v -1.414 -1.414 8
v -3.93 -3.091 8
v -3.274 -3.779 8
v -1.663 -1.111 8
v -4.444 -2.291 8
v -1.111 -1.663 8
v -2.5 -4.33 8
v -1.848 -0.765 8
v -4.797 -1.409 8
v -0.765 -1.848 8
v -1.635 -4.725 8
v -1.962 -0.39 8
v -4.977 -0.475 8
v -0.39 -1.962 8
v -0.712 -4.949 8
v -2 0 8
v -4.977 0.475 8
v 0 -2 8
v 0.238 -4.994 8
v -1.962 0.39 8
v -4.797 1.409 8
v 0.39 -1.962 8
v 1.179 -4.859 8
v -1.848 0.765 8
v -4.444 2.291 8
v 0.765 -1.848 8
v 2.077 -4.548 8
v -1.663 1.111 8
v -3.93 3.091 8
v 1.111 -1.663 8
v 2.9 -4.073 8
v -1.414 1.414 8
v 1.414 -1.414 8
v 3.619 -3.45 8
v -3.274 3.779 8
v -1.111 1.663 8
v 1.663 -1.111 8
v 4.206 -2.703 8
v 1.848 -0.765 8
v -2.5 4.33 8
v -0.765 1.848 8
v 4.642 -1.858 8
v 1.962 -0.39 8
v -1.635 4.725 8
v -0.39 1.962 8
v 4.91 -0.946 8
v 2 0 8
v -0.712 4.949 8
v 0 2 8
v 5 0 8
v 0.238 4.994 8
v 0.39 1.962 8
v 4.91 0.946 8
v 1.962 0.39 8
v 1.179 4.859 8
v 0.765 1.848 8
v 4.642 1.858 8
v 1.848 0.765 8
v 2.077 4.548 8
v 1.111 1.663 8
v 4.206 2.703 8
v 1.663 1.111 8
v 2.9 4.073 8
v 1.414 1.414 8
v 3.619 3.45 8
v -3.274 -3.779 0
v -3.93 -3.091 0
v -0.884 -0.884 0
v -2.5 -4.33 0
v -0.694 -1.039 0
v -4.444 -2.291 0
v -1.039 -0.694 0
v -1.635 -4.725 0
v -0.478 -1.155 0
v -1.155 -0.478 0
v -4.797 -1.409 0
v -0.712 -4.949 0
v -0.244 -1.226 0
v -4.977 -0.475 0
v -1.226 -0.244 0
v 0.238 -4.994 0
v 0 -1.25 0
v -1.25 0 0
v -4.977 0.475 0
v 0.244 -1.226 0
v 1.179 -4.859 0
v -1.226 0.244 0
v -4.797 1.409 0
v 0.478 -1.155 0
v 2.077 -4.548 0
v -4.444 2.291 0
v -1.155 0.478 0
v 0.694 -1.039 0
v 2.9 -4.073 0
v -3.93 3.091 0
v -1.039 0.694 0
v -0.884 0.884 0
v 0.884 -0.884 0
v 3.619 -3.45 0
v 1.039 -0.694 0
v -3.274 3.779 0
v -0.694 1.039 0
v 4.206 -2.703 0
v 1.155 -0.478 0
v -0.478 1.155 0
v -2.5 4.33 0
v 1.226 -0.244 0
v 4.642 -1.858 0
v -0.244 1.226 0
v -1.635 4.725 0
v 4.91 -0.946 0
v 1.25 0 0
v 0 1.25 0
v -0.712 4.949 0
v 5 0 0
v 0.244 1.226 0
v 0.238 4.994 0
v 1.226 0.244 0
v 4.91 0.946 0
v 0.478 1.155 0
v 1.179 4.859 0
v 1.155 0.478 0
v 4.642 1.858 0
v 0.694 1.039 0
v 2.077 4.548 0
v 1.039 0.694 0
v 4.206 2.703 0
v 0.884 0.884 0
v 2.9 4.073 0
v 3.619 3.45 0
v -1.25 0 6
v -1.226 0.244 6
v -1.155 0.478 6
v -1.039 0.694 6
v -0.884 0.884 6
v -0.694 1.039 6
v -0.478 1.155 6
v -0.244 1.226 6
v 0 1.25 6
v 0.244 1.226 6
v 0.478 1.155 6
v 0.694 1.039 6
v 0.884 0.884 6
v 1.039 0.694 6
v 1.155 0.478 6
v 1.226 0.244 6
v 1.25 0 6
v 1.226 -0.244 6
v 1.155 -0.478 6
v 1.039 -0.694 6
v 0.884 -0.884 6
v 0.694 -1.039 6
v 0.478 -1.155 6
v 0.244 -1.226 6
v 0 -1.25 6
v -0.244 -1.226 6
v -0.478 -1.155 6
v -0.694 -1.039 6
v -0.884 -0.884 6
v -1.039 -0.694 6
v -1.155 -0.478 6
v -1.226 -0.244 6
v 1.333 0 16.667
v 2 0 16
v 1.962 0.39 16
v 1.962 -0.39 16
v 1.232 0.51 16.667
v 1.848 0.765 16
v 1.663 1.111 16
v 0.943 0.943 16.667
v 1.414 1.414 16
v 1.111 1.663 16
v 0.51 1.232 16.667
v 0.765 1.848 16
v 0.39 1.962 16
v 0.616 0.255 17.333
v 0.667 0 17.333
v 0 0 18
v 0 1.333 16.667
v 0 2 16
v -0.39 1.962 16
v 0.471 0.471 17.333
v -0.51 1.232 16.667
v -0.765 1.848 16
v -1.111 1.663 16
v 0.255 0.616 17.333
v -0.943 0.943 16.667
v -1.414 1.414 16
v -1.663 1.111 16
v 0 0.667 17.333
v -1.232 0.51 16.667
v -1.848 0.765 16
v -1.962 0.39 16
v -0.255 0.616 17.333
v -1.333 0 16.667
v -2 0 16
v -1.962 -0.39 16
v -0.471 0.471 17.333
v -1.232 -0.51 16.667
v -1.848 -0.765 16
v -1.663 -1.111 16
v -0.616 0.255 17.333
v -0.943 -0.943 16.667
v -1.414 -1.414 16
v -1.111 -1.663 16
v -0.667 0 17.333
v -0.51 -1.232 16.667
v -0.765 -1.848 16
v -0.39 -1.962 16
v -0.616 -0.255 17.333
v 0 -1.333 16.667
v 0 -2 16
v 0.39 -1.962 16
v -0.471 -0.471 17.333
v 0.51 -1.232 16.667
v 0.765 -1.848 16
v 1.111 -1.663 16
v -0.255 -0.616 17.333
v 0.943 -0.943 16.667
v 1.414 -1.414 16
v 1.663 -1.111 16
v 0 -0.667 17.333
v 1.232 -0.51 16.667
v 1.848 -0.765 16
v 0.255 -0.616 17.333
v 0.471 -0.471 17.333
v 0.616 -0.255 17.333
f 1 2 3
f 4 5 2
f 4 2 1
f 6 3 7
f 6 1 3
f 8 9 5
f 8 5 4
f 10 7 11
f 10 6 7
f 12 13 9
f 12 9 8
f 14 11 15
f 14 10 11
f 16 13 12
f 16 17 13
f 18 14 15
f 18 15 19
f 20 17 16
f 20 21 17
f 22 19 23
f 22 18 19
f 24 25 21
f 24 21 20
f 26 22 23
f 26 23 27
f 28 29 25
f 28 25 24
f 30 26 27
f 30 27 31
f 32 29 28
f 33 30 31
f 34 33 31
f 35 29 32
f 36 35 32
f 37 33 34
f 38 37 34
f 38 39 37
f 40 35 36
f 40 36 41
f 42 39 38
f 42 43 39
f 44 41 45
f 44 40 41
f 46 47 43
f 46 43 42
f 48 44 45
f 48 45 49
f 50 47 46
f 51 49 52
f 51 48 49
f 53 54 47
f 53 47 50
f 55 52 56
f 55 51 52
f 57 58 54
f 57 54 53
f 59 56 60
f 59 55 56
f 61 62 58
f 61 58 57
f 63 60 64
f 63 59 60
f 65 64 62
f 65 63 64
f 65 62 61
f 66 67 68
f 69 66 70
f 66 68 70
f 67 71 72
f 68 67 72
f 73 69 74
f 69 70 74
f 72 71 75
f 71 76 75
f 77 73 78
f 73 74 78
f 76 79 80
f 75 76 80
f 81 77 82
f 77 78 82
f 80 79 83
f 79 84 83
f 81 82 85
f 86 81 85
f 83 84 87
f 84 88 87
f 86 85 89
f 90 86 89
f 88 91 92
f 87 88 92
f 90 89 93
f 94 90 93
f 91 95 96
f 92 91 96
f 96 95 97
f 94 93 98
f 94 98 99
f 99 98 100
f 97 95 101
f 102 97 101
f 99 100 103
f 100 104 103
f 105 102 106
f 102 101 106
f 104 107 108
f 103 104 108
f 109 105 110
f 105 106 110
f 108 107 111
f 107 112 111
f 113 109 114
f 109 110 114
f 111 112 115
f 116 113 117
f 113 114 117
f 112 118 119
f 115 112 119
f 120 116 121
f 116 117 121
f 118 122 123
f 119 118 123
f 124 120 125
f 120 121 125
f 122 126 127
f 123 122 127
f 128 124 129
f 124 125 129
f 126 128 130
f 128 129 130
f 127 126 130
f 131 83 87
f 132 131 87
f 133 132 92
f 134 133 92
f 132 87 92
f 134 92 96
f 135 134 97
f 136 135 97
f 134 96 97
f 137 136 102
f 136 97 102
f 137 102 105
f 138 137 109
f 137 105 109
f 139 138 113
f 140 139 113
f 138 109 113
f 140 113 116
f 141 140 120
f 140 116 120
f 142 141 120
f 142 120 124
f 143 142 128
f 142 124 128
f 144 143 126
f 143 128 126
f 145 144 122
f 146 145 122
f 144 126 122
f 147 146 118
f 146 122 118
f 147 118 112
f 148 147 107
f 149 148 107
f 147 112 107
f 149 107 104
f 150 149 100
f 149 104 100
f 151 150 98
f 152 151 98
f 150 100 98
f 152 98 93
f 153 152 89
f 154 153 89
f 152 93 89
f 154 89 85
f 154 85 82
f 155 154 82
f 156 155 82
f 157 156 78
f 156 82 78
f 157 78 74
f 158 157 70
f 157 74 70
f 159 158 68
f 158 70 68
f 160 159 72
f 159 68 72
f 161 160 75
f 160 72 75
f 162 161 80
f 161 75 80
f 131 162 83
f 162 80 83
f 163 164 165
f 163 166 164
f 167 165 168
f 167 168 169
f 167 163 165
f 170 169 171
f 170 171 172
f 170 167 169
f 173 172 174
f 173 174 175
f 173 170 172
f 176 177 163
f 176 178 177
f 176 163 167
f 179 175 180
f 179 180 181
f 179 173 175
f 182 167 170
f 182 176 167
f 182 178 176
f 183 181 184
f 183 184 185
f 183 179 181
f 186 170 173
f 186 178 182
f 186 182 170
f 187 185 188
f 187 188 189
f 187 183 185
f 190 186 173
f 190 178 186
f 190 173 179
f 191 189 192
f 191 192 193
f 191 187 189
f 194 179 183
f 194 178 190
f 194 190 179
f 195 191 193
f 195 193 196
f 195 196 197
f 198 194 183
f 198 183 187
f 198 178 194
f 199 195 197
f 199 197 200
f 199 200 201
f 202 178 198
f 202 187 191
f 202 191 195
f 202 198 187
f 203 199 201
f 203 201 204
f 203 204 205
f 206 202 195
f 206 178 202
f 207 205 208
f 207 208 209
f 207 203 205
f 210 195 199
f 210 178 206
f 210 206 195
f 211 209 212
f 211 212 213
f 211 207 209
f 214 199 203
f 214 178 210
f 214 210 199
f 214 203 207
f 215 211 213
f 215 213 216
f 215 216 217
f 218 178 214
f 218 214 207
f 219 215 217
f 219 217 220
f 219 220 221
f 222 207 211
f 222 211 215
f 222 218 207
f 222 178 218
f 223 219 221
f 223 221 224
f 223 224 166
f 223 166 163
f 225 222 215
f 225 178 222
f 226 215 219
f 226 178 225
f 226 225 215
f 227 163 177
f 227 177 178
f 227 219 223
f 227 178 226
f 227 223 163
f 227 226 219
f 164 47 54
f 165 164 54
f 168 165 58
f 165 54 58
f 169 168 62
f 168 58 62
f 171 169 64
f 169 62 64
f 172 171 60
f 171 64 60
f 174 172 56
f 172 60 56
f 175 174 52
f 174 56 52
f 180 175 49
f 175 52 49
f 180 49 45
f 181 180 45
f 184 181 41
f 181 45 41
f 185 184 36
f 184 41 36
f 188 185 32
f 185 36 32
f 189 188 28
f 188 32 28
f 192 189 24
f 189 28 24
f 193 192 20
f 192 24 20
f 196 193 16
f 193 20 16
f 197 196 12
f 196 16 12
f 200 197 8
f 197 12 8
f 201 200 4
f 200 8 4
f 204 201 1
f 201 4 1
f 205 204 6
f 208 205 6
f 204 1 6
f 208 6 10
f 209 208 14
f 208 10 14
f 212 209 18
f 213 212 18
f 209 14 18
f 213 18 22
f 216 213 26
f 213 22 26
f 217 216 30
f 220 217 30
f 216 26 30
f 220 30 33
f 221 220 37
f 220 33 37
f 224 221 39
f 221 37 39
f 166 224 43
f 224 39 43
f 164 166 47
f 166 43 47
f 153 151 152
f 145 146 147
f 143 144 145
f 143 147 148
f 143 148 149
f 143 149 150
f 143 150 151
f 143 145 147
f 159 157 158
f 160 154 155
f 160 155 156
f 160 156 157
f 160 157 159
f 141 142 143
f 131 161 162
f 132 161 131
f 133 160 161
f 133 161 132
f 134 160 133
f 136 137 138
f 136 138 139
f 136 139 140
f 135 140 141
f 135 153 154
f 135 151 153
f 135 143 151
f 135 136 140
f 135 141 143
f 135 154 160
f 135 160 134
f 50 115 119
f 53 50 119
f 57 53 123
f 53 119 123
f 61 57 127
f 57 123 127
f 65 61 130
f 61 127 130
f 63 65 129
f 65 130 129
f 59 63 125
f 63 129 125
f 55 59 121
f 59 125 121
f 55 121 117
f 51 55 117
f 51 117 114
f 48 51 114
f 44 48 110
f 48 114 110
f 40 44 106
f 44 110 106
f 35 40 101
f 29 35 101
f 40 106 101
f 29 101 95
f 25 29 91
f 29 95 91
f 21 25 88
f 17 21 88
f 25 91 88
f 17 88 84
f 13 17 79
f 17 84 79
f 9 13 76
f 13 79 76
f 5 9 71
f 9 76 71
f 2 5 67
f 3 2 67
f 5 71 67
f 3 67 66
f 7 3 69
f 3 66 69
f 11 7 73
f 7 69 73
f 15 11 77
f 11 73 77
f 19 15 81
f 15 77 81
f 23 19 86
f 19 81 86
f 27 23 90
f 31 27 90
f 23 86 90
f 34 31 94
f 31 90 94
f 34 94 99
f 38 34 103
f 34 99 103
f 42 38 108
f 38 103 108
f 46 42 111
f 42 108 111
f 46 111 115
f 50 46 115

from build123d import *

# Parameters (mm, degrees)
CROQUIS1_R              = 5
SALIENTE_EXTRUIR1_DEPTH = 8
CROQUIS2_R              = 1.25
CORTAR_EXTRUIR1_DEPTH   = 6
CROQUIS3_R              = 2
SALIENTE_EXTRUIR2_DEPTH = 10
CHAFL_N1_SIZE           = 2


with BuildPart() as part:
    # Croquis1 → Saliente-Extruir1 (new body)
    with BuildSketch(Plane.XY):
        Circle(CROQUIS1_R)
    extrude(amount=SALIENTE_EXTRUIR1_DEPTH)

    # Croquis2 → Cortar-Extruir1 (cut)
    with BuildSketch(Plane(origin=(0, 0, 0), x_dir=(-1, 0, 0), z_dir=(0, 0, -1))):
        Circle(CROQUIS2_R)
    extrude(amount=-CORTAR_EXTRUIR1_DEPTH, mode=Mode.SUBTRACT)

    # Croquis3 → Saliente-Extruir2 (add)
    with BuildSketch(Plane.XY.offset(8)):
        Circle(CROQUIS3_R)
    extrude(amount=SALIENTE_EXTRUIR2_DEPTH)

    # Chaflán1
    chafl_n1_edges = [part.edges().sort_by_distance(p)[0] for p in [
        (-2, 0, 18),
    ]]
    chamfer(chafl_n1_edges, length=CHAFL_N1_SIZE)


solid = part.part
